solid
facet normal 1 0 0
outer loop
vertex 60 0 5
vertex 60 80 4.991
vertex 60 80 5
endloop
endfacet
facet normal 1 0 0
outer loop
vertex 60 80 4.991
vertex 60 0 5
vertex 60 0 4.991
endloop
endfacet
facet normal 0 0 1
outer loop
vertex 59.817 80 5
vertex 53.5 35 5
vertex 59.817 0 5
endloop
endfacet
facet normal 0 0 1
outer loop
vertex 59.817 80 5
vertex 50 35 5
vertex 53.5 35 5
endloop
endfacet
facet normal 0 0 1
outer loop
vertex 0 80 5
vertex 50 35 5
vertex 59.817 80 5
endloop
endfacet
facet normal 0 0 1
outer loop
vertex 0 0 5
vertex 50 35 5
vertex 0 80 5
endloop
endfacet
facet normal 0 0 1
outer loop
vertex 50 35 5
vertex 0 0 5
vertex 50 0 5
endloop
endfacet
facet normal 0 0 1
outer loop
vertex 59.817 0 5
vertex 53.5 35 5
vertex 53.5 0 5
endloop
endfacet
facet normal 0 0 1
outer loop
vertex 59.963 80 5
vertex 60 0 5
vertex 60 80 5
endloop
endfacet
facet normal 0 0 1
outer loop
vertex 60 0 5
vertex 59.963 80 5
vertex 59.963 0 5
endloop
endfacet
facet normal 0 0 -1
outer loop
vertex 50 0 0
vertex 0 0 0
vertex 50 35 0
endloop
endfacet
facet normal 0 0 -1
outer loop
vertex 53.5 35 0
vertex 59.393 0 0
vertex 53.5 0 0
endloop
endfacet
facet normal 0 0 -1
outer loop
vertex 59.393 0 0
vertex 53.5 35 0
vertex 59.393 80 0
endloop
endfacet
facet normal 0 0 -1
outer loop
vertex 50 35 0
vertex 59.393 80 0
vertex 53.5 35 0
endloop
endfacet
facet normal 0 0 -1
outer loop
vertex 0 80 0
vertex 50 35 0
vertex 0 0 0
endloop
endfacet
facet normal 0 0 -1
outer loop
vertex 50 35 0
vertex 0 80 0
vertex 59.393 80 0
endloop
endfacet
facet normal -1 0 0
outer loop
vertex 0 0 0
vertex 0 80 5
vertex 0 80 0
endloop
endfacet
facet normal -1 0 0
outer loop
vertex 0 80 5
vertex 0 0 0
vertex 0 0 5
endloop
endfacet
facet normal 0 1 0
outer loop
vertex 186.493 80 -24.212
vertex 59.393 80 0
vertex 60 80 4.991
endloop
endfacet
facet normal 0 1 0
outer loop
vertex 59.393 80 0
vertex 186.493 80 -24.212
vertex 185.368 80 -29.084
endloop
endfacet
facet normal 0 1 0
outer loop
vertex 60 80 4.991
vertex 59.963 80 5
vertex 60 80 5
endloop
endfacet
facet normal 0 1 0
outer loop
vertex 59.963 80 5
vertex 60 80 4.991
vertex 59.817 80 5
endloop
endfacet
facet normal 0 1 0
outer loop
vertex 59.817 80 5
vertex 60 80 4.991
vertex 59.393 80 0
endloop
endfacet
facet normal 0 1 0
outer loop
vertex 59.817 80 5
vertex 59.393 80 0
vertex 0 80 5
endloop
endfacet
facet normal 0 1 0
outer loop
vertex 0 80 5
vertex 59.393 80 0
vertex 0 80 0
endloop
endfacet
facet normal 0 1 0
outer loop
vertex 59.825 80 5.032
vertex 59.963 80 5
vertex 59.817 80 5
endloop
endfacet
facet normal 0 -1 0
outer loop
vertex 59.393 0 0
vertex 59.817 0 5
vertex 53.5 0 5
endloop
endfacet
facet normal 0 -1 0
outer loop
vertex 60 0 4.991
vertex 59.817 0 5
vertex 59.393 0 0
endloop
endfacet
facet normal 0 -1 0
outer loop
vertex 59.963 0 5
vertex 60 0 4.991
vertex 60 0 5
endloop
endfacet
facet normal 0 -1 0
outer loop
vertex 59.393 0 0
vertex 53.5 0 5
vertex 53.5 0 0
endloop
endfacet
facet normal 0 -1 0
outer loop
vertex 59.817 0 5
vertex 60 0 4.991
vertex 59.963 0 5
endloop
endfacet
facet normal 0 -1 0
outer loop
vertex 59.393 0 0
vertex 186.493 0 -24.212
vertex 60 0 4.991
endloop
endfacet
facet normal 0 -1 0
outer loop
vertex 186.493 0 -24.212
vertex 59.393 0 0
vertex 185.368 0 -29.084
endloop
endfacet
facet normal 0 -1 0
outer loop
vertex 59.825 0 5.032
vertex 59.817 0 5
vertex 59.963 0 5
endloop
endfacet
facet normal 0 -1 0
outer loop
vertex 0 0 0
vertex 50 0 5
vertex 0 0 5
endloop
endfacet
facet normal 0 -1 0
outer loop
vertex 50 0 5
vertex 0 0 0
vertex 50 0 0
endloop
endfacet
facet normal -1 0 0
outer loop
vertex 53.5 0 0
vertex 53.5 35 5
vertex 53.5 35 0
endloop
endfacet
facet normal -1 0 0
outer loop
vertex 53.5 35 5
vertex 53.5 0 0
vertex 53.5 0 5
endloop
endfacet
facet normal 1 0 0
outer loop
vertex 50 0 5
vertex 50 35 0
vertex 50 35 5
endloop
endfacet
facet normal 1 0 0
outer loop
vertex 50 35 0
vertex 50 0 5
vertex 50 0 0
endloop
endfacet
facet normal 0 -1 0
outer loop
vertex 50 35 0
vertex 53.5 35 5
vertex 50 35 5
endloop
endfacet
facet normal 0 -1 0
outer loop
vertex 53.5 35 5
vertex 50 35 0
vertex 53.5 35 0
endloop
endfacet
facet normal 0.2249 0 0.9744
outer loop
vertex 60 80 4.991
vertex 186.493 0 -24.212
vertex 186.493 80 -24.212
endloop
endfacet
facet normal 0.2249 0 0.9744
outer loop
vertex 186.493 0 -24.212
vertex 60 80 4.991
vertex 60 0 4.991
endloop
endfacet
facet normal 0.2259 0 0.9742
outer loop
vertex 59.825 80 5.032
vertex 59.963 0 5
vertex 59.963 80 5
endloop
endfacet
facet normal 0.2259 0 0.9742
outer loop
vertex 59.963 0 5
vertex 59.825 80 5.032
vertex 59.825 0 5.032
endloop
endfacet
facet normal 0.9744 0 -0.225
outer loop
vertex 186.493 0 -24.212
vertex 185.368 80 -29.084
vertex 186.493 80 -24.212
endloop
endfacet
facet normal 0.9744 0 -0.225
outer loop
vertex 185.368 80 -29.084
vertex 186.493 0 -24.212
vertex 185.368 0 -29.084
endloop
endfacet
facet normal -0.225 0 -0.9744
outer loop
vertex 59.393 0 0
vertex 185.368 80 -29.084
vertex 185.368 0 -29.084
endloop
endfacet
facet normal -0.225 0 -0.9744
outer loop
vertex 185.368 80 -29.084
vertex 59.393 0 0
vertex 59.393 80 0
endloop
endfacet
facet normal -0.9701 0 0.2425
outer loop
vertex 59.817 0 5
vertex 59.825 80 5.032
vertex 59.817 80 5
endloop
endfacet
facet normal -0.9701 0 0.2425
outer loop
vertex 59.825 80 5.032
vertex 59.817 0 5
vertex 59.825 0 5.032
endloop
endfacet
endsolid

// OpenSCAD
thickness = 5;
width = 80;
notchLength = 35;

difference() {
    cube([60, width, thickness]);
    translate([50,0,0])
    cube([3.5, notchLength, thickness]);
}

translate([58.7,0,.16])
rotate([0,13,0])
cube([130, width, thickness]);
